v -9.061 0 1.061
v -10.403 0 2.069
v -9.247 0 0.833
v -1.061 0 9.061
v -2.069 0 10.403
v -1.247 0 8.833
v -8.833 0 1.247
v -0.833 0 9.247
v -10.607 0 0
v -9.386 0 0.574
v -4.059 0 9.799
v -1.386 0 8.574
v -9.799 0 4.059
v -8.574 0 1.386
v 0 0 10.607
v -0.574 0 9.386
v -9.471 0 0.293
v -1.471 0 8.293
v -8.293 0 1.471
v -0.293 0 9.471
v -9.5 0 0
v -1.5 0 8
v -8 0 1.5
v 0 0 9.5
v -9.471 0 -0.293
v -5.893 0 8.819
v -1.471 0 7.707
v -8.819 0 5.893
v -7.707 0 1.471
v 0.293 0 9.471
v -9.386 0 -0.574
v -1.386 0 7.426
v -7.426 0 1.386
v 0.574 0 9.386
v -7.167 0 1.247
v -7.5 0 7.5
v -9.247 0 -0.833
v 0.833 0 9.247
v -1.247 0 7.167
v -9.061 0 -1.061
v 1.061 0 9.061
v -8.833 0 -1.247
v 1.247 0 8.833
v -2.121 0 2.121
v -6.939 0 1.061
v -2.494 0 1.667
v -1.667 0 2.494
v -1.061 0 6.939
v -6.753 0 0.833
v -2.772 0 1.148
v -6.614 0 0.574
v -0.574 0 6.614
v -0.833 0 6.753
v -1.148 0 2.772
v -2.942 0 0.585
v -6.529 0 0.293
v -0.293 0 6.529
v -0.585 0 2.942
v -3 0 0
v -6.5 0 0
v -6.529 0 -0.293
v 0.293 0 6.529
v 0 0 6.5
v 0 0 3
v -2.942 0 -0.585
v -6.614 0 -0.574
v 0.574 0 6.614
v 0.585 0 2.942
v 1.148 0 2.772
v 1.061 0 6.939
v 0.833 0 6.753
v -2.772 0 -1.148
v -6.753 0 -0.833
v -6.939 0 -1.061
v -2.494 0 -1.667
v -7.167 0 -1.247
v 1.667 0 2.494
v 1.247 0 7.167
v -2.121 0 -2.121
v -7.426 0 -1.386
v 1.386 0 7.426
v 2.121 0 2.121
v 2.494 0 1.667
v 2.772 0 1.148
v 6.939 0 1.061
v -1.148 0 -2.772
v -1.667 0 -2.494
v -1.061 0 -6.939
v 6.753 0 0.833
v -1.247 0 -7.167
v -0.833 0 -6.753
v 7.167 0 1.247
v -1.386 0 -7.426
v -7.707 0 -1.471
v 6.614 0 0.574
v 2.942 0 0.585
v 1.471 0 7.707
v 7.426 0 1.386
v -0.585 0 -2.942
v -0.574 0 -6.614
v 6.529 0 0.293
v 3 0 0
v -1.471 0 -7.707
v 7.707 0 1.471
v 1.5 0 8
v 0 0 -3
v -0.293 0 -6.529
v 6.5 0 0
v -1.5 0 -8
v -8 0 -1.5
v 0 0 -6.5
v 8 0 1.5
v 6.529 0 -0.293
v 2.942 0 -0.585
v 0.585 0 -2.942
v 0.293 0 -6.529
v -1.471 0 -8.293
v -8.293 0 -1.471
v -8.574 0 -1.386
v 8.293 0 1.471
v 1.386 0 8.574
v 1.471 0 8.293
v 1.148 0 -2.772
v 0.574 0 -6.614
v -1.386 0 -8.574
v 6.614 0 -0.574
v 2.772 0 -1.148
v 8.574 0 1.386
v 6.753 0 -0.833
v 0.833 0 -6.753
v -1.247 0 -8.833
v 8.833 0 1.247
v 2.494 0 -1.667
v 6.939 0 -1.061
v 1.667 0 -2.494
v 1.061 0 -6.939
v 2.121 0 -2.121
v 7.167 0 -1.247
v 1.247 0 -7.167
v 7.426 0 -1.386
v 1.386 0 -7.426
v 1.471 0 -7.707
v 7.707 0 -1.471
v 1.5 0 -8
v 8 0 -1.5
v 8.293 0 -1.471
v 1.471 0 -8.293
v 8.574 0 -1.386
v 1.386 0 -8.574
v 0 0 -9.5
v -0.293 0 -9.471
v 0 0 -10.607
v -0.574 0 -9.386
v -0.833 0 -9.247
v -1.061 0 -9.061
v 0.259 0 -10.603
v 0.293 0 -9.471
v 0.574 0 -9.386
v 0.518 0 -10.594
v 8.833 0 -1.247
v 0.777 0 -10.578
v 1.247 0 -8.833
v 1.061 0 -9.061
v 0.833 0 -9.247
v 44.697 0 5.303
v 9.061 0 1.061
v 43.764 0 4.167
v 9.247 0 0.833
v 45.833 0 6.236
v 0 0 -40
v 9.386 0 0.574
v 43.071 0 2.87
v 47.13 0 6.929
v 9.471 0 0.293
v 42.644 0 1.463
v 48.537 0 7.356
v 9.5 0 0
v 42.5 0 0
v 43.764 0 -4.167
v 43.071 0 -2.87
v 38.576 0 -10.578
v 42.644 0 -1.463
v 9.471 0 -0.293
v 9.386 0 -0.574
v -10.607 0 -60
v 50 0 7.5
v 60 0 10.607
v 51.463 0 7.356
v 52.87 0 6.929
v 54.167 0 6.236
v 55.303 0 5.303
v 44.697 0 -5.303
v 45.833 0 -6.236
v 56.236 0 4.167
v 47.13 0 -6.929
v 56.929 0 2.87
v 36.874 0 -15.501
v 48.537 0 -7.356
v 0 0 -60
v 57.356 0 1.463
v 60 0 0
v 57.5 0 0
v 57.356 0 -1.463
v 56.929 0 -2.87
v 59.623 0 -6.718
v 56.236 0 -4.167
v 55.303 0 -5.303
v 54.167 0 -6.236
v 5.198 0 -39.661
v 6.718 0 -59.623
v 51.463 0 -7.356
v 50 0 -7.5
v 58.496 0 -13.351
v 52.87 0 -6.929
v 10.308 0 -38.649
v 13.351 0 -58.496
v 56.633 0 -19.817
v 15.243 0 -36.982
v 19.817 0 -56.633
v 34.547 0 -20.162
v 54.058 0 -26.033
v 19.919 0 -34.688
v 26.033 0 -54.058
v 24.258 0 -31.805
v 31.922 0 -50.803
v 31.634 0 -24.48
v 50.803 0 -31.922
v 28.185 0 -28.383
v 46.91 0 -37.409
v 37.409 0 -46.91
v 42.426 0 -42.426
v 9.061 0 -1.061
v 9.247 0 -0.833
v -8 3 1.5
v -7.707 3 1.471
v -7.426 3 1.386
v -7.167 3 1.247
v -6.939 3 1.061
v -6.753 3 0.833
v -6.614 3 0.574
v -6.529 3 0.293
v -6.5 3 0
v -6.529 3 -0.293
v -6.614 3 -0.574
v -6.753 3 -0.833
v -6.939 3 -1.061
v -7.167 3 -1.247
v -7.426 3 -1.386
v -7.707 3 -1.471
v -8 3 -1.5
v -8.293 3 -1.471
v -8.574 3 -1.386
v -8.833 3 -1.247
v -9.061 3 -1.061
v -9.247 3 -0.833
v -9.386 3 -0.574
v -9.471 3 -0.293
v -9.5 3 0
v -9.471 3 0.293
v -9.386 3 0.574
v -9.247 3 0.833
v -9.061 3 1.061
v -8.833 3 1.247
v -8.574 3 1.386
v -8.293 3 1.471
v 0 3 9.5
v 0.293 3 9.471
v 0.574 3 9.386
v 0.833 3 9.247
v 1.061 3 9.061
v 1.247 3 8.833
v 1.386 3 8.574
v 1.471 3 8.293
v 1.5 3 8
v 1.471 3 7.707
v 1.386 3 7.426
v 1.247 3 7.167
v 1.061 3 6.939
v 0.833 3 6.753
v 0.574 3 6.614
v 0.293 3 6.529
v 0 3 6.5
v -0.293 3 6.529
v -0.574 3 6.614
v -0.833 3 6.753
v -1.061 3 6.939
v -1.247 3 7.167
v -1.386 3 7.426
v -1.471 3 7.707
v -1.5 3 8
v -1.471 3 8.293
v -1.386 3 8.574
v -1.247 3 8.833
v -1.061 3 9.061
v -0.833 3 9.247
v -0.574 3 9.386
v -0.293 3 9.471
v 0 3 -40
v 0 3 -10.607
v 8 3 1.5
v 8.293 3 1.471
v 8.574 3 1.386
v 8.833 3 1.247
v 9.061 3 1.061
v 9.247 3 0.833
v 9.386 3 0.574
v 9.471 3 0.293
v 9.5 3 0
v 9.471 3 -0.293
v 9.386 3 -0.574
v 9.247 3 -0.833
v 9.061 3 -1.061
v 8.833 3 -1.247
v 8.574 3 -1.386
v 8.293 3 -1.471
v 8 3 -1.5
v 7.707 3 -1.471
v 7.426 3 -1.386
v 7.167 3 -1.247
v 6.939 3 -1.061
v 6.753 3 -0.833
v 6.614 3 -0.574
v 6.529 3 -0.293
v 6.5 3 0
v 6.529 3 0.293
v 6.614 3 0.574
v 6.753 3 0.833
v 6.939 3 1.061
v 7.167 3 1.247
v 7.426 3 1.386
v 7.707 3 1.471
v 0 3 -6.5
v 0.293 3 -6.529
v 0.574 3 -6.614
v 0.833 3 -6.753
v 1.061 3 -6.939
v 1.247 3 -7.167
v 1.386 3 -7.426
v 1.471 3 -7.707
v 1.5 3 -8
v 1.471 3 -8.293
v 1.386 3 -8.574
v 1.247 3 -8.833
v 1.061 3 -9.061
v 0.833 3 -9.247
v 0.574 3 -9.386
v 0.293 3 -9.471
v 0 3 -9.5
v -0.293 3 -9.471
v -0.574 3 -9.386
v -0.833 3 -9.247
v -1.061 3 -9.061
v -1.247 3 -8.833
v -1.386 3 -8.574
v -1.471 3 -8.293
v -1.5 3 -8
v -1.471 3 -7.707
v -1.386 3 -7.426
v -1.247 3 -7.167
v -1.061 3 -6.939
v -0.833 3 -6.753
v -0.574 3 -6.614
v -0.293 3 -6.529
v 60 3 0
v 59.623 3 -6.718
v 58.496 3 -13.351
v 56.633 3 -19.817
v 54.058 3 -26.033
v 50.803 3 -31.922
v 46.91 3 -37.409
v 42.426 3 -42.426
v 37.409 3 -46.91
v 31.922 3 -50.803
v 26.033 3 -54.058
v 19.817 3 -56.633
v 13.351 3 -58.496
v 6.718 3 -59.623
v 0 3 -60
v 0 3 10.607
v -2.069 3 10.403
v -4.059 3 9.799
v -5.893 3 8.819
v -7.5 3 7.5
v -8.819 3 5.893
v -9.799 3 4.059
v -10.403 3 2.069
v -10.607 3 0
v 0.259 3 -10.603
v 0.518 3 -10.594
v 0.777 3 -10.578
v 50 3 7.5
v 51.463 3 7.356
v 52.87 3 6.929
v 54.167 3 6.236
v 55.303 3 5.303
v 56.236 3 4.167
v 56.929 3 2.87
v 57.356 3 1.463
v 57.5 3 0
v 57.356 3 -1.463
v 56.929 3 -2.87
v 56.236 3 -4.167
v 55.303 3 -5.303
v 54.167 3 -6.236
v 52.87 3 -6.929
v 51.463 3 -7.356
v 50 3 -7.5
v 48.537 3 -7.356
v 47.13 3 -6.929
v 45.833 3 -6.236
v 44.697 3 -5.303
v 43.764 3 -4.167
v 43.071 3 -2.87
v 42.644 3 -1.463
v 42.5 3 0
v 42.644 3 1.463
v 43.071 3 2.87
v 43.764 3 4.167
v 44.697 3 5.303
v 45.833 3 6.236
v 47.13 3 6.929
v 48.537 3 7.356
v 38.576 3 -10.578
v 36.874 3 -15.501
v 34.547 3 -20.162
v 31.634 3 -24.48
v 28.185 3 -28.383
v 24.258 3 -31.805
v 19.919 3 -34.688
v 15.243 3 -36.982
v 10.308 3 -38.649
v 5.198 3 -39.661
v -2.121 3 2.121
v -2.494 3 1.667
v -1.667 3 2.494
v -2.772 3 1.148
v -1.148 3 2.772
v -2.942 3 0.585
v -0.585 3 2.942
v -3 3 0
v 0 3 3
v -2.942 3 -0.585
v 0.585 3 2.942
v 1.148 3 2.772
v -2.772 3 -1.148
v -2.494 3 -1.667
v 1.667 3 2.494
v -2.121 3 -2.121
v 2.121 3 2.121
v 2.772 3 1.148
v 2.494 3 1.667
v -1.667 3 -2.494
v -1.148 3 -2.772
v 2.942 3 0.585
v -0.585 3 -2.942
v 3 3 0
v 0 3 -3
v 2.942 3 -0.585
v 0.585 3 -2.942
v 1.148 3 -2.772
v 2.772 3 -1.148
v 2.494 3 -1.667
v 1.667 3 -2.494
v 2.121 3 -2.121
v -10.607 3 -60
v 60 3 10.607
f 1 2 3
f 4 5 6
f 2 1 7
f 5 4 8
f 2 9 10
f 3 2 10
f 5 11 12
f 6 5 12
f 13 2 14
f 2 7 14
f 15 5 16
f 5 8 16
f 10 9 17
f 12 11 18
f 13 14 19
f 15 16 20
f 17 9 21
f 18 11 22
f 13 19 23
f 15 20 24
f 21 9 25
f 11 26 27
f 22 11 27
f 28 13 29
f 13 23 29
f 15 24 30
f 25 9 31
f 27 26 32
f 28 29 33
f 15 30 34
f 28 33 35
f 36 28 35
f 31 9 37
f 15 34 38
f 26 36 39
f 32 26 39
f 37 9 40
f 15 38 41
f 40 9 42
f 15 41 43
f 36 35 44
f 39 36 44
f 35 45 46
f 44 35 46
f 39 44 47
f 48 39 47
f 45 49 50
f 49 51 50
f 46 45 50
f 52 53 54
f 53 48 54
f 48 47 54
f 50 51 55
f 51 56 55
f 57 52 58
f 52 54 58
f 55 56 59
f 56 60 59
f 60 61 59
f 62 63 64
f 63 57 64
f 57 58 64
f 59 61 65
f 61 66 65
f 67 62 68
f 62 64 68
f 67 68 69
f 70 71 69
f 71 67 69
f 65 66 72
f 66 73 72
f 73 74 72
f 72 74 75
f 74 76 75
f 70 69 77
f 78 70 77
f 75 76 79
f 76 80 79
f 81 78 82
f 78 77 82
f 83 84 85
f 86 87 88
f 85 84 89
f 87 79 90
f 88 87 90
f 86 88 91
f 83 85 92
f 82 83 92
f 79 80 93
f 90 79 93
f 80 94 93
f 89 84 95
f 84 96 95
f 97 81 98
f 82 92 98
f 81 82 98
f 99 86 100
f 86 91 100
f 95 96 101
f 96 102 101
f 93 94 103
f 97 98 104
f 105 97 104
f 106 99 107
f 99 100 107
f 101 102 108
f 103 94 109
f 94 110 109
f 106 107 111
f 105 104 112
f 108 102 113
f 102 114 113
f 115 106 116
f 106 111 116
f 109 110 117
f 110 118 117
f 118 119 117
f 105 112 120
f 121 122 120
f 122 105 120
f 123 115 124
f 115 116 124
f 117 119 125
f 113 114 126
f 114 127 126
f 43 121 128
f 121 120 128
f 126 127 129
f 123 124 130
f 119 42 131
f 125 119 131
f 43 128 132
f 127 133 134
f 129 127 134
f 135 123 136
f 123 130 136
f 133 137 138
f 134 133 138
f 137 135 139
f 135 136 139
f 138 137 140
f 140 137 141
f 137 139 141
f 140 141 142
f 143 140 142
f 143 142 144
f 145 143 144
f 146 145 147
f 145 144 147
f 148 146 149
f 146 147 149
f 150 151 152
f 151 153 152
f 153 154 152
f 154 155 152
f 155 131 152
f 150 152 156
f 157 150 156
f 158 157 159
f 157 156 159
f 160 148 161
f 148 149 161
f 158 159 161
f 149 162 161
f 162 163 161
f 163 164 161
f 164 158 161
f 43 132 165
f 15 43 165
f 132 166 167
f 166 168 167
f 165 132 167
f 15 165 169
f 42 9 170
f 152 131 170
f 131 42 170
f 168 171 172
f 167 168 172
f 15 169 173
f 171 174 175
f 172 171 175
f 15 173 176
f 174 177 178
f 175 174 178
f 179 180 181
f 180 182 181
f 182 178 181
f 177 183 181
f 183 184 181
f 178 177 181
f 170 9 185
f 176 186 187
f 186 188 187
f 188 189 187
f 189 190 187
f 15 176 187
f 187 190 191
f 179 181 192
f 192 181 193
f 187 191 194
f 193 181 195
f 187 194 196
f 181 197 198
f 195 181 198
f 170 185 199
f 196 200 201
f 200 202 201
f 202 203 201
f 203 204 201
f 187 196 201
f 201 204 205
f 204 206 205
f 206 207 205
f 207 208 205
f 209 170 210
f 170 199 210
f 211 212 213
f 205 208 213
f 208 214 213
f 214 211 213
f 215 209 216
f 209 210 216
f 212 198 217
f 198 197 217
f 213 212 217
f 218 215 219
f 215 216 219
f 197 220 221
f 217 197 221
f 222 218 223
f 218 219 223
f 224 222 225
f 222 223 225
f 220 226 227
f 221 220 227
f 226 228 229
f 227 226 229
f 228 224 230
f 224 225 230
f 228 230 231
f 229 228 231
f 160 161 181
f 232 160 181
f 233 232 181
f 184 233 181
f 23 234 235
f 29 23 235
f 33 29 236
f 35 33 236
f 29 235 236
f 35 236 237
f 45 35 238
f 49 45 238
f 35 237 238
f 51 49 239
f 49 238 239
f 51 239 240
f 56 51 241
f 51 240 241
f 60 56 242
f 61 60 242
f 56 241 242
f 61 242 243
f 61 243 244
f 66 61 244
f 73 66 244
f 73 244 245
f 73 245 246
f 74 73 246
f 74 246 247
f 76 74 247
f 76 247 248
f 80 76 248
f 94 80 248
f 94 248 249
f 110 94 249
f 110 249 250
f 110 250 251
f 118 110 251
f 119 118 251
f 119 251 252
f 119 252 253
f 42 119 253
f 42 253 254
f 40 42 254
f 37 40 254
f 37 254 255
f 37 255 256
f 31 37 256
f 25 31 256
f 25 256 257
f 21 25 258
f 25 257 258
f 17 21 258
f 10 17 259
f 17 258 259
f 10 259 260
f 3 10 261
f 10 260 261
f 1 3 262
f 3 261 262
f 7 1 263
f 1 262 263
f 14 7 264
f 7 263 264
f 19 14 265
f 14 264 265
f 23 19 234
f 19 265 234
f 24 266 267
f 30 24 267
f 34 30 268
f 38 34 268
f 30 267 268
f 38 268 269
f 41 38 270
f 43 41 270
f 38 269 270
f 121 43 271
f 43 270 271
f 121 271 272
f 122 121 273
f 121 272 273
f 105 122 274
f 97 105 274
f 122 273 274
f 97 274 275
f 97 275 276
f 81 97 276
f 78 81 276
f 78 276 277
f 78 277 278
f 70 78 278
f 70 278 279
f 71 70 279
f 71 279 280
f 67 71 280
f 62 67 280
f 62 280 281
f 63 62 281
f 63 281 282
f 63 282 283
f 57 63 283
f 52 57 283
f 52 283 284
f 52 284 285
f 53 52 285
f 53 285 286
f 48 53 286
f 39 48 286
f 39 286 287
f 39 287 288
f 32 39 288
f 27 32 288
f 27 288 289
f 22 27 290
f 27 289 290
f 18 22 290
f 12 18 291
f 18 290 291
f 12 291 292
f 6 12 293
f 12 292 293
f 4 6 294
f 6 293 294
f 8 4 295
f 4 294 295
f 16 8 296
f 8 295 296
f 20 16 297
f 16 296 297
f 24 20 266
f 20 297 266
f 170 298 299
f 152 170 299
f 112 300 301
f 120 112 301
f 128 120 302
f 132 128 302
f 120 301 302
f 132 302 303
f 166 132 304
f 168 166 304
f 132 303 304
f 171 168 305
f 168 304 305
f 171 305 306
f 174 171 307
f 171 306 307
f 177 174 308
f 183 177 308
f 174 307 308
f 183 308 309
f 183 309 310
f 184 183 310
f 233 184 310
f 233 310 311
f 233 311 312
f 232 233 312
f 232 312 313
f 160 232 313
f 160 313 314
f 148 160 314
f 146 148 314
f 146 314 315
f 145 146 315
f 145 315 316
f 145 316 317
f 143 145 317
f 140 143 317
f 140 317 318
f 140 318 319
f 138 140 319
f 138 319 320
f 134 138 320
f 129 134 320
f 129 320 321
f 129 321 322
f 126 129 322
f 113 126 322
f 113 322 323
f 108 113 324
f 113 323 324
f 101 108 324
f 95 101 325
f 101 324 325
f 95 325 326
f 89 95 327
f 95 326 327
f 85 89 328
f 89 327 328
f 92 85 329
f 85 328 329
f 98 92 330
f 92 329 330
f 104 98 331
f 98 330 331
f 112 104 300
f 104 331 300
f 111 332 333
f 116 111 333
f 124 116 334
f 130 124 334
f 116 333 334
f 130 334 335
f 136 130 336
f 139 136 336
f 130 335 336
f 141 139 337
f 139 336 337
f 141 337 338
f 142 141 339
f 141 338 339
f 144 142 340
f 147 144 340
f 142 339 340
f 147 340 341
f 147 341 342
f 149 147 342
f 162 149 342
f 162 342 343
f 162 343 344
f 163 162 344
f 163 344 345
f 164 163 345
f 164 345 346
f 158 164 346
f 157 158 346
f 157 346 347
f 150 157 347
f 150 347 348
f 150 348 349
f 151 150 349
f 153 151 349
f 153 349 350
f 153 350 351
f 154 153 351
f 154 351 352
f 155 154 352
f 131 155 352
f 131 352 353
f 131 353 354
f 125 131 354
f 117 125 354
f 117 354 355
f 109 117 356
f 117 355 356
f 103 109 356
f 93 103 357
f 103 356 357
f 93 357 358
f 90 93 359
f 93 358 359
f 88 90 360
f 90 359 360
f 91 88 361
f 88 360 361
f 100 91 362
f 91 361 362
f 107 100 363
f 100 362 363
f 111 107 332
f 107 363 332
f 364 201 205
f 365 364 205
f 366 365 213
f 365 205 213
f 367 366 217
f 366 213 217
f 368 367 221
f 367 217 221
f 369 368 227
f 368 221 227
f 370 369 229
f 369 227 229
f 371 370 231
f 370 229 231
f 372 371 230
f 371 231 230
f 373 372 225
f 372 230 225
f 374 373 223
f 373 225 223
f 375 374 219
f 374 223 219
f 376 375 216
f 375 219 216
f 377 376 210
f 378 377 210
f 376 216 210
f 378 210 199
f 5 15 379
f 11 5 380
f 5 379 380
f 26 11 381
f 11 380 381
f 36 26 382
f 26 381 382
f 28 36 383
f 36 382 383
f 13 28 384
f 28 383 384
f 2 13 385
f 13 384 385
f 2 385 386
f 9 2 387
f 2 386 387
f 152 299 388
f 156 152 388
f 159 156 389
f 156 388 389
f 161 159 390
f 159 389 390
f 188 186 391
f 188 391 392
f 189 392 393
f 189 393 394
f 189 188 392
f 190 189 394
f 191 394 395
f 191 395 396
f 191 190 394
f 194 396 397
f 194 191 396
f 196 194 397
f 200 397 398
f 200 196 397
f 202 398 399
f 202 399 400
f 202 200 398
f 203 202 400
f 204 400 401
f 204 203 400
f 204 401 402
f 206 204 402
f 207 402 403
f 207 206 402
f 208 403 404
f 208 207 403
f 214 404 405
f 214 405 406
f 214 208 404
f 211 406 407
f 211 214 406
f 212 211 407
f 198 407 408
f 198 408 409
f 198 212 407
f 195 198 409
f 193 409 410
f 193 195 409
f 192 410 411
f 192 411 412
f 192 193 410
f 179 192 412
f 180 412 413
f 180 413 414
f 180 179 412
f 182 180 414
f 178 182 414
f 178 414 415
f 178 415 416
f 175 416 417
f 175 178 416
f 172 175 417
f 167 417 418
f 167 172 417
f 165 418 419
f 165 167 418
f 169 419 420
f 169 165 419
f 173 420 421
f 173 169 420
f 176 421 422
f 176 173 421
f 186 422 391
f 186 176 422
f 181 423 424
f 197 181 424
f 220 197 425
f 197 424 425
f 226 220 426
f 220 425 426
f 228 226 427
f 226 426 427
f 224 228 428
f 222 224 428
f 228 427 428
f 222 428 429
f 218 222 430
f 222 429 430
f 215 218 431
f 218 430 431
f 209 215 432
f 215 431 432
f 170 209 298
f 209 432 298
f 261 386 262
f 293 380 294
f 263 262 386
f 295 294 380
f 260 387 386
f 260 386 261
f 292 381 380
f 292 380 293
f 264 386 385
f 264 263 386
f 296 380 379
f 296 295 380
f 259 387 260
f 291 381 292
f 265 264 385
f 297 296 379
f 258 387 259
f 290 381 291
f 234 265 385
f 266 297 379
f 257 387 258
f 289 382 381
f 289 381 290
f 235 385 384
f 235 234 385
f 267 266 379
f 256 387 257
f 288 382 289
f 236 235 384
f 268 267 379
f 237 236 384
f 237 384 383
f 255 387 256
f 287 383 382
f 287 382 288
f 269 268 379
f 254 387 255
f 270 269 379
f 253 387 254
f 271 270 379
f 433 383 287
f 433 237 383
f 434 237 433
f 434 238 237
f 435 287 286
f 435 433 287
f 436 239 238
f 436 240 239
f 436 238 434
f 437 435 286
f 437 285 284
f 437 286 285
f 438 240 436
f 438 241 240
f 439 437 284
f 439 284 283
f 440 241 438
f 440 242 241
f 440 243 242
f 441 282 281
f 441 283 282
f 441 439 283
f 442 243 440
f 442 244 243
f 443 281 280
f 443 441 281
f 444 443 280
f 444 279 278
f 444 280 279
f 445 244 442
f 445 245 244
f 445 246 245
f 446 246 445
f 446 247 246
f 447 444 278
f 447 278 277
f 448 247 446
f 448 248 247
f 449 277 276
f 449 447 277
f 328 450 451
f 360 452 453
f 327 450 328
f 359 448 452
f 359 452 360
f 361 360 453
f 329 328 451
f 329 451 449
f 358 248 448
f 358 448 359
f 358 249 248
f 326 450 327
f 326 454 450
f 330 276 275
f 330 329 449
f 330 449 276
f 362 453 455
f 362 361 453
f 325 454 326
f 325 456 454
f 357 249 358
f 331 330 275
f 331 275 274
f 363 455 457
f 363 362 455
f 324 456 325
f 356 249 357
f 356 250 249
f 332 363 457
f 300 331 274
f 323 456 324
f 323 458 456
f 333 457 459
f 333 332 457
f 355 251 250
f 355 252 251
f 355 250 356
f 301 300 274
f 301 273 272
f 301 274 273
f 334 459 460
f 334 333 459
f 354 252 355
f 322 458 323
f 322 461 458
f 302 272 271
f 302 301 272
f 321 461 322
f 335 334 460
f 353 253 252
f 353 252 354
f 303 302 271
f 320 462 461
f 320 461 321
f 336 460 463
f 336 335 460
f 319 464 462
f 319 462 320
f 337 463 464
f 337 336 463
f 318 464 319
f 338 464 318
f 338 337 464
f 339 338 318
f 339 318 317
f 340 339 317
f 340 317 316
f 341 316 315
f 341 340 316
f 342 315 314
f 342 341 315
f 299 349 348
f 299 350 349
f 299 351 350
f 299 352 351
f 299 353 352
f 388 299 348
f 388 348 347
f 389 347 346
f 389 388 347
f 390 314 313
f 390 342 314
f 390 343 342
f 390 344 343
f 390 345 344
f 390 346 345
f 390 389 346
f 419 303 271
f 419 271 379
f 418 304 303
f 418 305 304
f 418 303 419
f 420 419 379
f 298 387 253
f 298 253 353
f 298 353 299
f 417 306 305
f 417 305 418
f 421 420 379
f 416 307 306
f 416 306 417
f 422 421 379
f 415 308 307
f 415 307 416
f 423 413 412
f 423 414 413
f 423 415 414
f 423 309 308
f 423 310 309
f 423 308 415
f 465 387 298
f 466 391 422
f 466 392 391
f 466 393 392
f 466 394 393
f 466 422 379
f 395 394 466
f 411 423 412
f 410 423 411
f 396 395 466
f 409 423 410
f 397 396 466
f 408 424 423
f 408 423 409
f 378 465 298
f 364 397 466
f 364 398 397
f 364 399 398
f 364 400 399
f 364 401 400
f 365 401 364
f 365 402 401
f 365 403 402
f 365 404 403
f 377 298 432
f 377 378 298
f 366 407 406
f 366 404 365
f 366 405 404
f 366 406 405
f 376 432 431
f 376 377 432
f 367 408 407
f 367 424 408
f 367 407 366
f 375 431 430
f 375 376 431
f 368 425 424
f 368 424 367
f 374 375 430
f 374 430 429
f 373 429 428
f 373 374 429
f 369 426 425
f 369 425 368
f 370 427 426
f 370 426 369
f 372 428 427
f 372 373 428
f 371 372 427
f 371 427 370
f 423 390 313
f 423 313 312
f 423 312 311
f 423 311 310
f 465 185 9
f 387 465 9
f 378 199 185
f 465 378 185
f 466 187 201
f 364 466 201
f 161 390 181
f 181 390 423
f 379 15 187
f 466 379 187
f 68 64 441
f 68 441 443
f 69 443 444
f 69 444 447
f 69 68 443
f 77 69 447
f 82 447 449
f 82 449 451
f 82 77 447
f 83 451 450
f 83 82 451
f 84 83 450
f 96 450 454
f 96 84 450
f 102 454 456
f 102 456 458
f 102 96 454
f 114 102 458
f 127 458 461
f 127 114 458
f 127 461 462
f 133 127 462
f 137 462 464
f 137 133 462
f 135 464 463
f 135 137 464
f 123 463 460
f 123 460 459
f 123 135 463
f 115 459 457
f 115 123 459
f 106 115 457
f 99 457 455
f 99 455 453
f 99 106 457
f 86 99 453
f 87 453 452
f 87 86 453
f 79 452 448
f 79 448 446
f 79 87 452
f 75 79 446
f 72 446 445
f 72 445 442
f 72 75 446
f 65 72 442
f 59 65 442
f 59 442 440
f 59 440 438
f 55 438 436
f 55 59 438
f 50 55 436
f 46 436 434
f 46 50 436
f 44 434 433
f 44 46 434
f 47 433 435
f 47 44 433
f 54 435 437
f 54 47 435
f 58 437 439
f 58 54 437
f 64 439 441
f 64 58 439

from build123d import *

# Parameters (mm, degrees)
SKETCH1_R             = 3
SKETCH1_R_2           = 7.5
BOSS_EXTRUDE1_DEPTH   = 3
CORTAR_EXTRUIR1_DEPTH = 85.905830189
CROQUIS2_R            = 1.5
CORTAR_EXTRUIR2_DEPTH = 85.905830189


with BuildPart() as part:
    # Sketch1 → Boss-Extrude1 (new body)
    with BuildSketch(Plane(origin=(0, 0, 0), x_dir=(1, 0, 0), z_dir=(0, 1, 0))):
        with BuildLine():
            Line((-10.606601718, 60), (-10.606601718, -10.606601718))
            Line((-10.606601718, -10.606601718), (60, -10.606601718))
            Line((60, -10.606601718), (60, 0))
            ThreePointArc((60, 0), (42.426406871, 42.426406871), (0, 60))
            Line((0, 60), (-10.606601718, 60))
        make_face()
        with Locations(Location((0, 0, 0), (0, 0, 270))):
            Circle(SKETCH1_R, mode=Mode.SUBTRACT)
        with Locations(Location((50, 0, 0), (0, 0, 270))):
            Circle(SKETCH1_R_2, mode=Mode.SUBTRACT)
    extrude(amount=BOSS_EXTRUDE1_DEPTH)

    # Croquis1 → Cortar-Extruir1 (cut, through all)
    with BuildSketch(Plane(origin=(0, 3, 0), x_dir=(1, 0, 0), z_dir=(0, 1, 0))):
        with BuildLine():
            ThreePointArc((0, 10.606601718), (0.38870443, 10.59947682), (0.776886642, 10.5781117))
            Line((0.776886642, 10.5781117), (38.575945262, 10.5781117))
            ThreePointArc((38.575945262, 10.5781117), (24.257736209, 31.805066169), (0, 40))
            Line((0, 40), (0, 10.606601718))
        make_face()
        with BuildLine():
            ThreePointArc((0, -10.606601718), (-7.5, -7.5), (-10.606601718, 0))
            Line((-10.606601718, 0), (-10.606601718, -10.606601718))
            Line((-10.606601718, -10.606601718), (0, -10.606601718))
        make_face()
    extrude(amount=-CORTAR_EXTRUIR1_DEPTH, mode=Mode.SUBTRACT)

    # Croquis2 → Cortar-Extruir2 (cut, through all)
    with BuildSketch(Plane(origin=(0, 3, 0), x_dir=(1, 0, 0), z_dir=(0, 1, 0))):
        with Locations(Location((8, 0, 0), (0, 0, 270))):
            Circle(CROQUIS2_R)
        with Locations(Location((0, -8, 0), (0, 0, 270))):
            Circle(CROQUIS2_R)
        with Locations(Location((-8, 0, 0), (0, 0, 270))):
            Circle(CROQUIS2_R)
        with Locations(Location((0, 8, 0), (0, 0, 270))):
            Circle(CROQUIS2_R)
    extrude(amount=-CORTAR_EXTRUIR2_DEPTH, mode=Mode.SUBTRACT)


solid = part.part
